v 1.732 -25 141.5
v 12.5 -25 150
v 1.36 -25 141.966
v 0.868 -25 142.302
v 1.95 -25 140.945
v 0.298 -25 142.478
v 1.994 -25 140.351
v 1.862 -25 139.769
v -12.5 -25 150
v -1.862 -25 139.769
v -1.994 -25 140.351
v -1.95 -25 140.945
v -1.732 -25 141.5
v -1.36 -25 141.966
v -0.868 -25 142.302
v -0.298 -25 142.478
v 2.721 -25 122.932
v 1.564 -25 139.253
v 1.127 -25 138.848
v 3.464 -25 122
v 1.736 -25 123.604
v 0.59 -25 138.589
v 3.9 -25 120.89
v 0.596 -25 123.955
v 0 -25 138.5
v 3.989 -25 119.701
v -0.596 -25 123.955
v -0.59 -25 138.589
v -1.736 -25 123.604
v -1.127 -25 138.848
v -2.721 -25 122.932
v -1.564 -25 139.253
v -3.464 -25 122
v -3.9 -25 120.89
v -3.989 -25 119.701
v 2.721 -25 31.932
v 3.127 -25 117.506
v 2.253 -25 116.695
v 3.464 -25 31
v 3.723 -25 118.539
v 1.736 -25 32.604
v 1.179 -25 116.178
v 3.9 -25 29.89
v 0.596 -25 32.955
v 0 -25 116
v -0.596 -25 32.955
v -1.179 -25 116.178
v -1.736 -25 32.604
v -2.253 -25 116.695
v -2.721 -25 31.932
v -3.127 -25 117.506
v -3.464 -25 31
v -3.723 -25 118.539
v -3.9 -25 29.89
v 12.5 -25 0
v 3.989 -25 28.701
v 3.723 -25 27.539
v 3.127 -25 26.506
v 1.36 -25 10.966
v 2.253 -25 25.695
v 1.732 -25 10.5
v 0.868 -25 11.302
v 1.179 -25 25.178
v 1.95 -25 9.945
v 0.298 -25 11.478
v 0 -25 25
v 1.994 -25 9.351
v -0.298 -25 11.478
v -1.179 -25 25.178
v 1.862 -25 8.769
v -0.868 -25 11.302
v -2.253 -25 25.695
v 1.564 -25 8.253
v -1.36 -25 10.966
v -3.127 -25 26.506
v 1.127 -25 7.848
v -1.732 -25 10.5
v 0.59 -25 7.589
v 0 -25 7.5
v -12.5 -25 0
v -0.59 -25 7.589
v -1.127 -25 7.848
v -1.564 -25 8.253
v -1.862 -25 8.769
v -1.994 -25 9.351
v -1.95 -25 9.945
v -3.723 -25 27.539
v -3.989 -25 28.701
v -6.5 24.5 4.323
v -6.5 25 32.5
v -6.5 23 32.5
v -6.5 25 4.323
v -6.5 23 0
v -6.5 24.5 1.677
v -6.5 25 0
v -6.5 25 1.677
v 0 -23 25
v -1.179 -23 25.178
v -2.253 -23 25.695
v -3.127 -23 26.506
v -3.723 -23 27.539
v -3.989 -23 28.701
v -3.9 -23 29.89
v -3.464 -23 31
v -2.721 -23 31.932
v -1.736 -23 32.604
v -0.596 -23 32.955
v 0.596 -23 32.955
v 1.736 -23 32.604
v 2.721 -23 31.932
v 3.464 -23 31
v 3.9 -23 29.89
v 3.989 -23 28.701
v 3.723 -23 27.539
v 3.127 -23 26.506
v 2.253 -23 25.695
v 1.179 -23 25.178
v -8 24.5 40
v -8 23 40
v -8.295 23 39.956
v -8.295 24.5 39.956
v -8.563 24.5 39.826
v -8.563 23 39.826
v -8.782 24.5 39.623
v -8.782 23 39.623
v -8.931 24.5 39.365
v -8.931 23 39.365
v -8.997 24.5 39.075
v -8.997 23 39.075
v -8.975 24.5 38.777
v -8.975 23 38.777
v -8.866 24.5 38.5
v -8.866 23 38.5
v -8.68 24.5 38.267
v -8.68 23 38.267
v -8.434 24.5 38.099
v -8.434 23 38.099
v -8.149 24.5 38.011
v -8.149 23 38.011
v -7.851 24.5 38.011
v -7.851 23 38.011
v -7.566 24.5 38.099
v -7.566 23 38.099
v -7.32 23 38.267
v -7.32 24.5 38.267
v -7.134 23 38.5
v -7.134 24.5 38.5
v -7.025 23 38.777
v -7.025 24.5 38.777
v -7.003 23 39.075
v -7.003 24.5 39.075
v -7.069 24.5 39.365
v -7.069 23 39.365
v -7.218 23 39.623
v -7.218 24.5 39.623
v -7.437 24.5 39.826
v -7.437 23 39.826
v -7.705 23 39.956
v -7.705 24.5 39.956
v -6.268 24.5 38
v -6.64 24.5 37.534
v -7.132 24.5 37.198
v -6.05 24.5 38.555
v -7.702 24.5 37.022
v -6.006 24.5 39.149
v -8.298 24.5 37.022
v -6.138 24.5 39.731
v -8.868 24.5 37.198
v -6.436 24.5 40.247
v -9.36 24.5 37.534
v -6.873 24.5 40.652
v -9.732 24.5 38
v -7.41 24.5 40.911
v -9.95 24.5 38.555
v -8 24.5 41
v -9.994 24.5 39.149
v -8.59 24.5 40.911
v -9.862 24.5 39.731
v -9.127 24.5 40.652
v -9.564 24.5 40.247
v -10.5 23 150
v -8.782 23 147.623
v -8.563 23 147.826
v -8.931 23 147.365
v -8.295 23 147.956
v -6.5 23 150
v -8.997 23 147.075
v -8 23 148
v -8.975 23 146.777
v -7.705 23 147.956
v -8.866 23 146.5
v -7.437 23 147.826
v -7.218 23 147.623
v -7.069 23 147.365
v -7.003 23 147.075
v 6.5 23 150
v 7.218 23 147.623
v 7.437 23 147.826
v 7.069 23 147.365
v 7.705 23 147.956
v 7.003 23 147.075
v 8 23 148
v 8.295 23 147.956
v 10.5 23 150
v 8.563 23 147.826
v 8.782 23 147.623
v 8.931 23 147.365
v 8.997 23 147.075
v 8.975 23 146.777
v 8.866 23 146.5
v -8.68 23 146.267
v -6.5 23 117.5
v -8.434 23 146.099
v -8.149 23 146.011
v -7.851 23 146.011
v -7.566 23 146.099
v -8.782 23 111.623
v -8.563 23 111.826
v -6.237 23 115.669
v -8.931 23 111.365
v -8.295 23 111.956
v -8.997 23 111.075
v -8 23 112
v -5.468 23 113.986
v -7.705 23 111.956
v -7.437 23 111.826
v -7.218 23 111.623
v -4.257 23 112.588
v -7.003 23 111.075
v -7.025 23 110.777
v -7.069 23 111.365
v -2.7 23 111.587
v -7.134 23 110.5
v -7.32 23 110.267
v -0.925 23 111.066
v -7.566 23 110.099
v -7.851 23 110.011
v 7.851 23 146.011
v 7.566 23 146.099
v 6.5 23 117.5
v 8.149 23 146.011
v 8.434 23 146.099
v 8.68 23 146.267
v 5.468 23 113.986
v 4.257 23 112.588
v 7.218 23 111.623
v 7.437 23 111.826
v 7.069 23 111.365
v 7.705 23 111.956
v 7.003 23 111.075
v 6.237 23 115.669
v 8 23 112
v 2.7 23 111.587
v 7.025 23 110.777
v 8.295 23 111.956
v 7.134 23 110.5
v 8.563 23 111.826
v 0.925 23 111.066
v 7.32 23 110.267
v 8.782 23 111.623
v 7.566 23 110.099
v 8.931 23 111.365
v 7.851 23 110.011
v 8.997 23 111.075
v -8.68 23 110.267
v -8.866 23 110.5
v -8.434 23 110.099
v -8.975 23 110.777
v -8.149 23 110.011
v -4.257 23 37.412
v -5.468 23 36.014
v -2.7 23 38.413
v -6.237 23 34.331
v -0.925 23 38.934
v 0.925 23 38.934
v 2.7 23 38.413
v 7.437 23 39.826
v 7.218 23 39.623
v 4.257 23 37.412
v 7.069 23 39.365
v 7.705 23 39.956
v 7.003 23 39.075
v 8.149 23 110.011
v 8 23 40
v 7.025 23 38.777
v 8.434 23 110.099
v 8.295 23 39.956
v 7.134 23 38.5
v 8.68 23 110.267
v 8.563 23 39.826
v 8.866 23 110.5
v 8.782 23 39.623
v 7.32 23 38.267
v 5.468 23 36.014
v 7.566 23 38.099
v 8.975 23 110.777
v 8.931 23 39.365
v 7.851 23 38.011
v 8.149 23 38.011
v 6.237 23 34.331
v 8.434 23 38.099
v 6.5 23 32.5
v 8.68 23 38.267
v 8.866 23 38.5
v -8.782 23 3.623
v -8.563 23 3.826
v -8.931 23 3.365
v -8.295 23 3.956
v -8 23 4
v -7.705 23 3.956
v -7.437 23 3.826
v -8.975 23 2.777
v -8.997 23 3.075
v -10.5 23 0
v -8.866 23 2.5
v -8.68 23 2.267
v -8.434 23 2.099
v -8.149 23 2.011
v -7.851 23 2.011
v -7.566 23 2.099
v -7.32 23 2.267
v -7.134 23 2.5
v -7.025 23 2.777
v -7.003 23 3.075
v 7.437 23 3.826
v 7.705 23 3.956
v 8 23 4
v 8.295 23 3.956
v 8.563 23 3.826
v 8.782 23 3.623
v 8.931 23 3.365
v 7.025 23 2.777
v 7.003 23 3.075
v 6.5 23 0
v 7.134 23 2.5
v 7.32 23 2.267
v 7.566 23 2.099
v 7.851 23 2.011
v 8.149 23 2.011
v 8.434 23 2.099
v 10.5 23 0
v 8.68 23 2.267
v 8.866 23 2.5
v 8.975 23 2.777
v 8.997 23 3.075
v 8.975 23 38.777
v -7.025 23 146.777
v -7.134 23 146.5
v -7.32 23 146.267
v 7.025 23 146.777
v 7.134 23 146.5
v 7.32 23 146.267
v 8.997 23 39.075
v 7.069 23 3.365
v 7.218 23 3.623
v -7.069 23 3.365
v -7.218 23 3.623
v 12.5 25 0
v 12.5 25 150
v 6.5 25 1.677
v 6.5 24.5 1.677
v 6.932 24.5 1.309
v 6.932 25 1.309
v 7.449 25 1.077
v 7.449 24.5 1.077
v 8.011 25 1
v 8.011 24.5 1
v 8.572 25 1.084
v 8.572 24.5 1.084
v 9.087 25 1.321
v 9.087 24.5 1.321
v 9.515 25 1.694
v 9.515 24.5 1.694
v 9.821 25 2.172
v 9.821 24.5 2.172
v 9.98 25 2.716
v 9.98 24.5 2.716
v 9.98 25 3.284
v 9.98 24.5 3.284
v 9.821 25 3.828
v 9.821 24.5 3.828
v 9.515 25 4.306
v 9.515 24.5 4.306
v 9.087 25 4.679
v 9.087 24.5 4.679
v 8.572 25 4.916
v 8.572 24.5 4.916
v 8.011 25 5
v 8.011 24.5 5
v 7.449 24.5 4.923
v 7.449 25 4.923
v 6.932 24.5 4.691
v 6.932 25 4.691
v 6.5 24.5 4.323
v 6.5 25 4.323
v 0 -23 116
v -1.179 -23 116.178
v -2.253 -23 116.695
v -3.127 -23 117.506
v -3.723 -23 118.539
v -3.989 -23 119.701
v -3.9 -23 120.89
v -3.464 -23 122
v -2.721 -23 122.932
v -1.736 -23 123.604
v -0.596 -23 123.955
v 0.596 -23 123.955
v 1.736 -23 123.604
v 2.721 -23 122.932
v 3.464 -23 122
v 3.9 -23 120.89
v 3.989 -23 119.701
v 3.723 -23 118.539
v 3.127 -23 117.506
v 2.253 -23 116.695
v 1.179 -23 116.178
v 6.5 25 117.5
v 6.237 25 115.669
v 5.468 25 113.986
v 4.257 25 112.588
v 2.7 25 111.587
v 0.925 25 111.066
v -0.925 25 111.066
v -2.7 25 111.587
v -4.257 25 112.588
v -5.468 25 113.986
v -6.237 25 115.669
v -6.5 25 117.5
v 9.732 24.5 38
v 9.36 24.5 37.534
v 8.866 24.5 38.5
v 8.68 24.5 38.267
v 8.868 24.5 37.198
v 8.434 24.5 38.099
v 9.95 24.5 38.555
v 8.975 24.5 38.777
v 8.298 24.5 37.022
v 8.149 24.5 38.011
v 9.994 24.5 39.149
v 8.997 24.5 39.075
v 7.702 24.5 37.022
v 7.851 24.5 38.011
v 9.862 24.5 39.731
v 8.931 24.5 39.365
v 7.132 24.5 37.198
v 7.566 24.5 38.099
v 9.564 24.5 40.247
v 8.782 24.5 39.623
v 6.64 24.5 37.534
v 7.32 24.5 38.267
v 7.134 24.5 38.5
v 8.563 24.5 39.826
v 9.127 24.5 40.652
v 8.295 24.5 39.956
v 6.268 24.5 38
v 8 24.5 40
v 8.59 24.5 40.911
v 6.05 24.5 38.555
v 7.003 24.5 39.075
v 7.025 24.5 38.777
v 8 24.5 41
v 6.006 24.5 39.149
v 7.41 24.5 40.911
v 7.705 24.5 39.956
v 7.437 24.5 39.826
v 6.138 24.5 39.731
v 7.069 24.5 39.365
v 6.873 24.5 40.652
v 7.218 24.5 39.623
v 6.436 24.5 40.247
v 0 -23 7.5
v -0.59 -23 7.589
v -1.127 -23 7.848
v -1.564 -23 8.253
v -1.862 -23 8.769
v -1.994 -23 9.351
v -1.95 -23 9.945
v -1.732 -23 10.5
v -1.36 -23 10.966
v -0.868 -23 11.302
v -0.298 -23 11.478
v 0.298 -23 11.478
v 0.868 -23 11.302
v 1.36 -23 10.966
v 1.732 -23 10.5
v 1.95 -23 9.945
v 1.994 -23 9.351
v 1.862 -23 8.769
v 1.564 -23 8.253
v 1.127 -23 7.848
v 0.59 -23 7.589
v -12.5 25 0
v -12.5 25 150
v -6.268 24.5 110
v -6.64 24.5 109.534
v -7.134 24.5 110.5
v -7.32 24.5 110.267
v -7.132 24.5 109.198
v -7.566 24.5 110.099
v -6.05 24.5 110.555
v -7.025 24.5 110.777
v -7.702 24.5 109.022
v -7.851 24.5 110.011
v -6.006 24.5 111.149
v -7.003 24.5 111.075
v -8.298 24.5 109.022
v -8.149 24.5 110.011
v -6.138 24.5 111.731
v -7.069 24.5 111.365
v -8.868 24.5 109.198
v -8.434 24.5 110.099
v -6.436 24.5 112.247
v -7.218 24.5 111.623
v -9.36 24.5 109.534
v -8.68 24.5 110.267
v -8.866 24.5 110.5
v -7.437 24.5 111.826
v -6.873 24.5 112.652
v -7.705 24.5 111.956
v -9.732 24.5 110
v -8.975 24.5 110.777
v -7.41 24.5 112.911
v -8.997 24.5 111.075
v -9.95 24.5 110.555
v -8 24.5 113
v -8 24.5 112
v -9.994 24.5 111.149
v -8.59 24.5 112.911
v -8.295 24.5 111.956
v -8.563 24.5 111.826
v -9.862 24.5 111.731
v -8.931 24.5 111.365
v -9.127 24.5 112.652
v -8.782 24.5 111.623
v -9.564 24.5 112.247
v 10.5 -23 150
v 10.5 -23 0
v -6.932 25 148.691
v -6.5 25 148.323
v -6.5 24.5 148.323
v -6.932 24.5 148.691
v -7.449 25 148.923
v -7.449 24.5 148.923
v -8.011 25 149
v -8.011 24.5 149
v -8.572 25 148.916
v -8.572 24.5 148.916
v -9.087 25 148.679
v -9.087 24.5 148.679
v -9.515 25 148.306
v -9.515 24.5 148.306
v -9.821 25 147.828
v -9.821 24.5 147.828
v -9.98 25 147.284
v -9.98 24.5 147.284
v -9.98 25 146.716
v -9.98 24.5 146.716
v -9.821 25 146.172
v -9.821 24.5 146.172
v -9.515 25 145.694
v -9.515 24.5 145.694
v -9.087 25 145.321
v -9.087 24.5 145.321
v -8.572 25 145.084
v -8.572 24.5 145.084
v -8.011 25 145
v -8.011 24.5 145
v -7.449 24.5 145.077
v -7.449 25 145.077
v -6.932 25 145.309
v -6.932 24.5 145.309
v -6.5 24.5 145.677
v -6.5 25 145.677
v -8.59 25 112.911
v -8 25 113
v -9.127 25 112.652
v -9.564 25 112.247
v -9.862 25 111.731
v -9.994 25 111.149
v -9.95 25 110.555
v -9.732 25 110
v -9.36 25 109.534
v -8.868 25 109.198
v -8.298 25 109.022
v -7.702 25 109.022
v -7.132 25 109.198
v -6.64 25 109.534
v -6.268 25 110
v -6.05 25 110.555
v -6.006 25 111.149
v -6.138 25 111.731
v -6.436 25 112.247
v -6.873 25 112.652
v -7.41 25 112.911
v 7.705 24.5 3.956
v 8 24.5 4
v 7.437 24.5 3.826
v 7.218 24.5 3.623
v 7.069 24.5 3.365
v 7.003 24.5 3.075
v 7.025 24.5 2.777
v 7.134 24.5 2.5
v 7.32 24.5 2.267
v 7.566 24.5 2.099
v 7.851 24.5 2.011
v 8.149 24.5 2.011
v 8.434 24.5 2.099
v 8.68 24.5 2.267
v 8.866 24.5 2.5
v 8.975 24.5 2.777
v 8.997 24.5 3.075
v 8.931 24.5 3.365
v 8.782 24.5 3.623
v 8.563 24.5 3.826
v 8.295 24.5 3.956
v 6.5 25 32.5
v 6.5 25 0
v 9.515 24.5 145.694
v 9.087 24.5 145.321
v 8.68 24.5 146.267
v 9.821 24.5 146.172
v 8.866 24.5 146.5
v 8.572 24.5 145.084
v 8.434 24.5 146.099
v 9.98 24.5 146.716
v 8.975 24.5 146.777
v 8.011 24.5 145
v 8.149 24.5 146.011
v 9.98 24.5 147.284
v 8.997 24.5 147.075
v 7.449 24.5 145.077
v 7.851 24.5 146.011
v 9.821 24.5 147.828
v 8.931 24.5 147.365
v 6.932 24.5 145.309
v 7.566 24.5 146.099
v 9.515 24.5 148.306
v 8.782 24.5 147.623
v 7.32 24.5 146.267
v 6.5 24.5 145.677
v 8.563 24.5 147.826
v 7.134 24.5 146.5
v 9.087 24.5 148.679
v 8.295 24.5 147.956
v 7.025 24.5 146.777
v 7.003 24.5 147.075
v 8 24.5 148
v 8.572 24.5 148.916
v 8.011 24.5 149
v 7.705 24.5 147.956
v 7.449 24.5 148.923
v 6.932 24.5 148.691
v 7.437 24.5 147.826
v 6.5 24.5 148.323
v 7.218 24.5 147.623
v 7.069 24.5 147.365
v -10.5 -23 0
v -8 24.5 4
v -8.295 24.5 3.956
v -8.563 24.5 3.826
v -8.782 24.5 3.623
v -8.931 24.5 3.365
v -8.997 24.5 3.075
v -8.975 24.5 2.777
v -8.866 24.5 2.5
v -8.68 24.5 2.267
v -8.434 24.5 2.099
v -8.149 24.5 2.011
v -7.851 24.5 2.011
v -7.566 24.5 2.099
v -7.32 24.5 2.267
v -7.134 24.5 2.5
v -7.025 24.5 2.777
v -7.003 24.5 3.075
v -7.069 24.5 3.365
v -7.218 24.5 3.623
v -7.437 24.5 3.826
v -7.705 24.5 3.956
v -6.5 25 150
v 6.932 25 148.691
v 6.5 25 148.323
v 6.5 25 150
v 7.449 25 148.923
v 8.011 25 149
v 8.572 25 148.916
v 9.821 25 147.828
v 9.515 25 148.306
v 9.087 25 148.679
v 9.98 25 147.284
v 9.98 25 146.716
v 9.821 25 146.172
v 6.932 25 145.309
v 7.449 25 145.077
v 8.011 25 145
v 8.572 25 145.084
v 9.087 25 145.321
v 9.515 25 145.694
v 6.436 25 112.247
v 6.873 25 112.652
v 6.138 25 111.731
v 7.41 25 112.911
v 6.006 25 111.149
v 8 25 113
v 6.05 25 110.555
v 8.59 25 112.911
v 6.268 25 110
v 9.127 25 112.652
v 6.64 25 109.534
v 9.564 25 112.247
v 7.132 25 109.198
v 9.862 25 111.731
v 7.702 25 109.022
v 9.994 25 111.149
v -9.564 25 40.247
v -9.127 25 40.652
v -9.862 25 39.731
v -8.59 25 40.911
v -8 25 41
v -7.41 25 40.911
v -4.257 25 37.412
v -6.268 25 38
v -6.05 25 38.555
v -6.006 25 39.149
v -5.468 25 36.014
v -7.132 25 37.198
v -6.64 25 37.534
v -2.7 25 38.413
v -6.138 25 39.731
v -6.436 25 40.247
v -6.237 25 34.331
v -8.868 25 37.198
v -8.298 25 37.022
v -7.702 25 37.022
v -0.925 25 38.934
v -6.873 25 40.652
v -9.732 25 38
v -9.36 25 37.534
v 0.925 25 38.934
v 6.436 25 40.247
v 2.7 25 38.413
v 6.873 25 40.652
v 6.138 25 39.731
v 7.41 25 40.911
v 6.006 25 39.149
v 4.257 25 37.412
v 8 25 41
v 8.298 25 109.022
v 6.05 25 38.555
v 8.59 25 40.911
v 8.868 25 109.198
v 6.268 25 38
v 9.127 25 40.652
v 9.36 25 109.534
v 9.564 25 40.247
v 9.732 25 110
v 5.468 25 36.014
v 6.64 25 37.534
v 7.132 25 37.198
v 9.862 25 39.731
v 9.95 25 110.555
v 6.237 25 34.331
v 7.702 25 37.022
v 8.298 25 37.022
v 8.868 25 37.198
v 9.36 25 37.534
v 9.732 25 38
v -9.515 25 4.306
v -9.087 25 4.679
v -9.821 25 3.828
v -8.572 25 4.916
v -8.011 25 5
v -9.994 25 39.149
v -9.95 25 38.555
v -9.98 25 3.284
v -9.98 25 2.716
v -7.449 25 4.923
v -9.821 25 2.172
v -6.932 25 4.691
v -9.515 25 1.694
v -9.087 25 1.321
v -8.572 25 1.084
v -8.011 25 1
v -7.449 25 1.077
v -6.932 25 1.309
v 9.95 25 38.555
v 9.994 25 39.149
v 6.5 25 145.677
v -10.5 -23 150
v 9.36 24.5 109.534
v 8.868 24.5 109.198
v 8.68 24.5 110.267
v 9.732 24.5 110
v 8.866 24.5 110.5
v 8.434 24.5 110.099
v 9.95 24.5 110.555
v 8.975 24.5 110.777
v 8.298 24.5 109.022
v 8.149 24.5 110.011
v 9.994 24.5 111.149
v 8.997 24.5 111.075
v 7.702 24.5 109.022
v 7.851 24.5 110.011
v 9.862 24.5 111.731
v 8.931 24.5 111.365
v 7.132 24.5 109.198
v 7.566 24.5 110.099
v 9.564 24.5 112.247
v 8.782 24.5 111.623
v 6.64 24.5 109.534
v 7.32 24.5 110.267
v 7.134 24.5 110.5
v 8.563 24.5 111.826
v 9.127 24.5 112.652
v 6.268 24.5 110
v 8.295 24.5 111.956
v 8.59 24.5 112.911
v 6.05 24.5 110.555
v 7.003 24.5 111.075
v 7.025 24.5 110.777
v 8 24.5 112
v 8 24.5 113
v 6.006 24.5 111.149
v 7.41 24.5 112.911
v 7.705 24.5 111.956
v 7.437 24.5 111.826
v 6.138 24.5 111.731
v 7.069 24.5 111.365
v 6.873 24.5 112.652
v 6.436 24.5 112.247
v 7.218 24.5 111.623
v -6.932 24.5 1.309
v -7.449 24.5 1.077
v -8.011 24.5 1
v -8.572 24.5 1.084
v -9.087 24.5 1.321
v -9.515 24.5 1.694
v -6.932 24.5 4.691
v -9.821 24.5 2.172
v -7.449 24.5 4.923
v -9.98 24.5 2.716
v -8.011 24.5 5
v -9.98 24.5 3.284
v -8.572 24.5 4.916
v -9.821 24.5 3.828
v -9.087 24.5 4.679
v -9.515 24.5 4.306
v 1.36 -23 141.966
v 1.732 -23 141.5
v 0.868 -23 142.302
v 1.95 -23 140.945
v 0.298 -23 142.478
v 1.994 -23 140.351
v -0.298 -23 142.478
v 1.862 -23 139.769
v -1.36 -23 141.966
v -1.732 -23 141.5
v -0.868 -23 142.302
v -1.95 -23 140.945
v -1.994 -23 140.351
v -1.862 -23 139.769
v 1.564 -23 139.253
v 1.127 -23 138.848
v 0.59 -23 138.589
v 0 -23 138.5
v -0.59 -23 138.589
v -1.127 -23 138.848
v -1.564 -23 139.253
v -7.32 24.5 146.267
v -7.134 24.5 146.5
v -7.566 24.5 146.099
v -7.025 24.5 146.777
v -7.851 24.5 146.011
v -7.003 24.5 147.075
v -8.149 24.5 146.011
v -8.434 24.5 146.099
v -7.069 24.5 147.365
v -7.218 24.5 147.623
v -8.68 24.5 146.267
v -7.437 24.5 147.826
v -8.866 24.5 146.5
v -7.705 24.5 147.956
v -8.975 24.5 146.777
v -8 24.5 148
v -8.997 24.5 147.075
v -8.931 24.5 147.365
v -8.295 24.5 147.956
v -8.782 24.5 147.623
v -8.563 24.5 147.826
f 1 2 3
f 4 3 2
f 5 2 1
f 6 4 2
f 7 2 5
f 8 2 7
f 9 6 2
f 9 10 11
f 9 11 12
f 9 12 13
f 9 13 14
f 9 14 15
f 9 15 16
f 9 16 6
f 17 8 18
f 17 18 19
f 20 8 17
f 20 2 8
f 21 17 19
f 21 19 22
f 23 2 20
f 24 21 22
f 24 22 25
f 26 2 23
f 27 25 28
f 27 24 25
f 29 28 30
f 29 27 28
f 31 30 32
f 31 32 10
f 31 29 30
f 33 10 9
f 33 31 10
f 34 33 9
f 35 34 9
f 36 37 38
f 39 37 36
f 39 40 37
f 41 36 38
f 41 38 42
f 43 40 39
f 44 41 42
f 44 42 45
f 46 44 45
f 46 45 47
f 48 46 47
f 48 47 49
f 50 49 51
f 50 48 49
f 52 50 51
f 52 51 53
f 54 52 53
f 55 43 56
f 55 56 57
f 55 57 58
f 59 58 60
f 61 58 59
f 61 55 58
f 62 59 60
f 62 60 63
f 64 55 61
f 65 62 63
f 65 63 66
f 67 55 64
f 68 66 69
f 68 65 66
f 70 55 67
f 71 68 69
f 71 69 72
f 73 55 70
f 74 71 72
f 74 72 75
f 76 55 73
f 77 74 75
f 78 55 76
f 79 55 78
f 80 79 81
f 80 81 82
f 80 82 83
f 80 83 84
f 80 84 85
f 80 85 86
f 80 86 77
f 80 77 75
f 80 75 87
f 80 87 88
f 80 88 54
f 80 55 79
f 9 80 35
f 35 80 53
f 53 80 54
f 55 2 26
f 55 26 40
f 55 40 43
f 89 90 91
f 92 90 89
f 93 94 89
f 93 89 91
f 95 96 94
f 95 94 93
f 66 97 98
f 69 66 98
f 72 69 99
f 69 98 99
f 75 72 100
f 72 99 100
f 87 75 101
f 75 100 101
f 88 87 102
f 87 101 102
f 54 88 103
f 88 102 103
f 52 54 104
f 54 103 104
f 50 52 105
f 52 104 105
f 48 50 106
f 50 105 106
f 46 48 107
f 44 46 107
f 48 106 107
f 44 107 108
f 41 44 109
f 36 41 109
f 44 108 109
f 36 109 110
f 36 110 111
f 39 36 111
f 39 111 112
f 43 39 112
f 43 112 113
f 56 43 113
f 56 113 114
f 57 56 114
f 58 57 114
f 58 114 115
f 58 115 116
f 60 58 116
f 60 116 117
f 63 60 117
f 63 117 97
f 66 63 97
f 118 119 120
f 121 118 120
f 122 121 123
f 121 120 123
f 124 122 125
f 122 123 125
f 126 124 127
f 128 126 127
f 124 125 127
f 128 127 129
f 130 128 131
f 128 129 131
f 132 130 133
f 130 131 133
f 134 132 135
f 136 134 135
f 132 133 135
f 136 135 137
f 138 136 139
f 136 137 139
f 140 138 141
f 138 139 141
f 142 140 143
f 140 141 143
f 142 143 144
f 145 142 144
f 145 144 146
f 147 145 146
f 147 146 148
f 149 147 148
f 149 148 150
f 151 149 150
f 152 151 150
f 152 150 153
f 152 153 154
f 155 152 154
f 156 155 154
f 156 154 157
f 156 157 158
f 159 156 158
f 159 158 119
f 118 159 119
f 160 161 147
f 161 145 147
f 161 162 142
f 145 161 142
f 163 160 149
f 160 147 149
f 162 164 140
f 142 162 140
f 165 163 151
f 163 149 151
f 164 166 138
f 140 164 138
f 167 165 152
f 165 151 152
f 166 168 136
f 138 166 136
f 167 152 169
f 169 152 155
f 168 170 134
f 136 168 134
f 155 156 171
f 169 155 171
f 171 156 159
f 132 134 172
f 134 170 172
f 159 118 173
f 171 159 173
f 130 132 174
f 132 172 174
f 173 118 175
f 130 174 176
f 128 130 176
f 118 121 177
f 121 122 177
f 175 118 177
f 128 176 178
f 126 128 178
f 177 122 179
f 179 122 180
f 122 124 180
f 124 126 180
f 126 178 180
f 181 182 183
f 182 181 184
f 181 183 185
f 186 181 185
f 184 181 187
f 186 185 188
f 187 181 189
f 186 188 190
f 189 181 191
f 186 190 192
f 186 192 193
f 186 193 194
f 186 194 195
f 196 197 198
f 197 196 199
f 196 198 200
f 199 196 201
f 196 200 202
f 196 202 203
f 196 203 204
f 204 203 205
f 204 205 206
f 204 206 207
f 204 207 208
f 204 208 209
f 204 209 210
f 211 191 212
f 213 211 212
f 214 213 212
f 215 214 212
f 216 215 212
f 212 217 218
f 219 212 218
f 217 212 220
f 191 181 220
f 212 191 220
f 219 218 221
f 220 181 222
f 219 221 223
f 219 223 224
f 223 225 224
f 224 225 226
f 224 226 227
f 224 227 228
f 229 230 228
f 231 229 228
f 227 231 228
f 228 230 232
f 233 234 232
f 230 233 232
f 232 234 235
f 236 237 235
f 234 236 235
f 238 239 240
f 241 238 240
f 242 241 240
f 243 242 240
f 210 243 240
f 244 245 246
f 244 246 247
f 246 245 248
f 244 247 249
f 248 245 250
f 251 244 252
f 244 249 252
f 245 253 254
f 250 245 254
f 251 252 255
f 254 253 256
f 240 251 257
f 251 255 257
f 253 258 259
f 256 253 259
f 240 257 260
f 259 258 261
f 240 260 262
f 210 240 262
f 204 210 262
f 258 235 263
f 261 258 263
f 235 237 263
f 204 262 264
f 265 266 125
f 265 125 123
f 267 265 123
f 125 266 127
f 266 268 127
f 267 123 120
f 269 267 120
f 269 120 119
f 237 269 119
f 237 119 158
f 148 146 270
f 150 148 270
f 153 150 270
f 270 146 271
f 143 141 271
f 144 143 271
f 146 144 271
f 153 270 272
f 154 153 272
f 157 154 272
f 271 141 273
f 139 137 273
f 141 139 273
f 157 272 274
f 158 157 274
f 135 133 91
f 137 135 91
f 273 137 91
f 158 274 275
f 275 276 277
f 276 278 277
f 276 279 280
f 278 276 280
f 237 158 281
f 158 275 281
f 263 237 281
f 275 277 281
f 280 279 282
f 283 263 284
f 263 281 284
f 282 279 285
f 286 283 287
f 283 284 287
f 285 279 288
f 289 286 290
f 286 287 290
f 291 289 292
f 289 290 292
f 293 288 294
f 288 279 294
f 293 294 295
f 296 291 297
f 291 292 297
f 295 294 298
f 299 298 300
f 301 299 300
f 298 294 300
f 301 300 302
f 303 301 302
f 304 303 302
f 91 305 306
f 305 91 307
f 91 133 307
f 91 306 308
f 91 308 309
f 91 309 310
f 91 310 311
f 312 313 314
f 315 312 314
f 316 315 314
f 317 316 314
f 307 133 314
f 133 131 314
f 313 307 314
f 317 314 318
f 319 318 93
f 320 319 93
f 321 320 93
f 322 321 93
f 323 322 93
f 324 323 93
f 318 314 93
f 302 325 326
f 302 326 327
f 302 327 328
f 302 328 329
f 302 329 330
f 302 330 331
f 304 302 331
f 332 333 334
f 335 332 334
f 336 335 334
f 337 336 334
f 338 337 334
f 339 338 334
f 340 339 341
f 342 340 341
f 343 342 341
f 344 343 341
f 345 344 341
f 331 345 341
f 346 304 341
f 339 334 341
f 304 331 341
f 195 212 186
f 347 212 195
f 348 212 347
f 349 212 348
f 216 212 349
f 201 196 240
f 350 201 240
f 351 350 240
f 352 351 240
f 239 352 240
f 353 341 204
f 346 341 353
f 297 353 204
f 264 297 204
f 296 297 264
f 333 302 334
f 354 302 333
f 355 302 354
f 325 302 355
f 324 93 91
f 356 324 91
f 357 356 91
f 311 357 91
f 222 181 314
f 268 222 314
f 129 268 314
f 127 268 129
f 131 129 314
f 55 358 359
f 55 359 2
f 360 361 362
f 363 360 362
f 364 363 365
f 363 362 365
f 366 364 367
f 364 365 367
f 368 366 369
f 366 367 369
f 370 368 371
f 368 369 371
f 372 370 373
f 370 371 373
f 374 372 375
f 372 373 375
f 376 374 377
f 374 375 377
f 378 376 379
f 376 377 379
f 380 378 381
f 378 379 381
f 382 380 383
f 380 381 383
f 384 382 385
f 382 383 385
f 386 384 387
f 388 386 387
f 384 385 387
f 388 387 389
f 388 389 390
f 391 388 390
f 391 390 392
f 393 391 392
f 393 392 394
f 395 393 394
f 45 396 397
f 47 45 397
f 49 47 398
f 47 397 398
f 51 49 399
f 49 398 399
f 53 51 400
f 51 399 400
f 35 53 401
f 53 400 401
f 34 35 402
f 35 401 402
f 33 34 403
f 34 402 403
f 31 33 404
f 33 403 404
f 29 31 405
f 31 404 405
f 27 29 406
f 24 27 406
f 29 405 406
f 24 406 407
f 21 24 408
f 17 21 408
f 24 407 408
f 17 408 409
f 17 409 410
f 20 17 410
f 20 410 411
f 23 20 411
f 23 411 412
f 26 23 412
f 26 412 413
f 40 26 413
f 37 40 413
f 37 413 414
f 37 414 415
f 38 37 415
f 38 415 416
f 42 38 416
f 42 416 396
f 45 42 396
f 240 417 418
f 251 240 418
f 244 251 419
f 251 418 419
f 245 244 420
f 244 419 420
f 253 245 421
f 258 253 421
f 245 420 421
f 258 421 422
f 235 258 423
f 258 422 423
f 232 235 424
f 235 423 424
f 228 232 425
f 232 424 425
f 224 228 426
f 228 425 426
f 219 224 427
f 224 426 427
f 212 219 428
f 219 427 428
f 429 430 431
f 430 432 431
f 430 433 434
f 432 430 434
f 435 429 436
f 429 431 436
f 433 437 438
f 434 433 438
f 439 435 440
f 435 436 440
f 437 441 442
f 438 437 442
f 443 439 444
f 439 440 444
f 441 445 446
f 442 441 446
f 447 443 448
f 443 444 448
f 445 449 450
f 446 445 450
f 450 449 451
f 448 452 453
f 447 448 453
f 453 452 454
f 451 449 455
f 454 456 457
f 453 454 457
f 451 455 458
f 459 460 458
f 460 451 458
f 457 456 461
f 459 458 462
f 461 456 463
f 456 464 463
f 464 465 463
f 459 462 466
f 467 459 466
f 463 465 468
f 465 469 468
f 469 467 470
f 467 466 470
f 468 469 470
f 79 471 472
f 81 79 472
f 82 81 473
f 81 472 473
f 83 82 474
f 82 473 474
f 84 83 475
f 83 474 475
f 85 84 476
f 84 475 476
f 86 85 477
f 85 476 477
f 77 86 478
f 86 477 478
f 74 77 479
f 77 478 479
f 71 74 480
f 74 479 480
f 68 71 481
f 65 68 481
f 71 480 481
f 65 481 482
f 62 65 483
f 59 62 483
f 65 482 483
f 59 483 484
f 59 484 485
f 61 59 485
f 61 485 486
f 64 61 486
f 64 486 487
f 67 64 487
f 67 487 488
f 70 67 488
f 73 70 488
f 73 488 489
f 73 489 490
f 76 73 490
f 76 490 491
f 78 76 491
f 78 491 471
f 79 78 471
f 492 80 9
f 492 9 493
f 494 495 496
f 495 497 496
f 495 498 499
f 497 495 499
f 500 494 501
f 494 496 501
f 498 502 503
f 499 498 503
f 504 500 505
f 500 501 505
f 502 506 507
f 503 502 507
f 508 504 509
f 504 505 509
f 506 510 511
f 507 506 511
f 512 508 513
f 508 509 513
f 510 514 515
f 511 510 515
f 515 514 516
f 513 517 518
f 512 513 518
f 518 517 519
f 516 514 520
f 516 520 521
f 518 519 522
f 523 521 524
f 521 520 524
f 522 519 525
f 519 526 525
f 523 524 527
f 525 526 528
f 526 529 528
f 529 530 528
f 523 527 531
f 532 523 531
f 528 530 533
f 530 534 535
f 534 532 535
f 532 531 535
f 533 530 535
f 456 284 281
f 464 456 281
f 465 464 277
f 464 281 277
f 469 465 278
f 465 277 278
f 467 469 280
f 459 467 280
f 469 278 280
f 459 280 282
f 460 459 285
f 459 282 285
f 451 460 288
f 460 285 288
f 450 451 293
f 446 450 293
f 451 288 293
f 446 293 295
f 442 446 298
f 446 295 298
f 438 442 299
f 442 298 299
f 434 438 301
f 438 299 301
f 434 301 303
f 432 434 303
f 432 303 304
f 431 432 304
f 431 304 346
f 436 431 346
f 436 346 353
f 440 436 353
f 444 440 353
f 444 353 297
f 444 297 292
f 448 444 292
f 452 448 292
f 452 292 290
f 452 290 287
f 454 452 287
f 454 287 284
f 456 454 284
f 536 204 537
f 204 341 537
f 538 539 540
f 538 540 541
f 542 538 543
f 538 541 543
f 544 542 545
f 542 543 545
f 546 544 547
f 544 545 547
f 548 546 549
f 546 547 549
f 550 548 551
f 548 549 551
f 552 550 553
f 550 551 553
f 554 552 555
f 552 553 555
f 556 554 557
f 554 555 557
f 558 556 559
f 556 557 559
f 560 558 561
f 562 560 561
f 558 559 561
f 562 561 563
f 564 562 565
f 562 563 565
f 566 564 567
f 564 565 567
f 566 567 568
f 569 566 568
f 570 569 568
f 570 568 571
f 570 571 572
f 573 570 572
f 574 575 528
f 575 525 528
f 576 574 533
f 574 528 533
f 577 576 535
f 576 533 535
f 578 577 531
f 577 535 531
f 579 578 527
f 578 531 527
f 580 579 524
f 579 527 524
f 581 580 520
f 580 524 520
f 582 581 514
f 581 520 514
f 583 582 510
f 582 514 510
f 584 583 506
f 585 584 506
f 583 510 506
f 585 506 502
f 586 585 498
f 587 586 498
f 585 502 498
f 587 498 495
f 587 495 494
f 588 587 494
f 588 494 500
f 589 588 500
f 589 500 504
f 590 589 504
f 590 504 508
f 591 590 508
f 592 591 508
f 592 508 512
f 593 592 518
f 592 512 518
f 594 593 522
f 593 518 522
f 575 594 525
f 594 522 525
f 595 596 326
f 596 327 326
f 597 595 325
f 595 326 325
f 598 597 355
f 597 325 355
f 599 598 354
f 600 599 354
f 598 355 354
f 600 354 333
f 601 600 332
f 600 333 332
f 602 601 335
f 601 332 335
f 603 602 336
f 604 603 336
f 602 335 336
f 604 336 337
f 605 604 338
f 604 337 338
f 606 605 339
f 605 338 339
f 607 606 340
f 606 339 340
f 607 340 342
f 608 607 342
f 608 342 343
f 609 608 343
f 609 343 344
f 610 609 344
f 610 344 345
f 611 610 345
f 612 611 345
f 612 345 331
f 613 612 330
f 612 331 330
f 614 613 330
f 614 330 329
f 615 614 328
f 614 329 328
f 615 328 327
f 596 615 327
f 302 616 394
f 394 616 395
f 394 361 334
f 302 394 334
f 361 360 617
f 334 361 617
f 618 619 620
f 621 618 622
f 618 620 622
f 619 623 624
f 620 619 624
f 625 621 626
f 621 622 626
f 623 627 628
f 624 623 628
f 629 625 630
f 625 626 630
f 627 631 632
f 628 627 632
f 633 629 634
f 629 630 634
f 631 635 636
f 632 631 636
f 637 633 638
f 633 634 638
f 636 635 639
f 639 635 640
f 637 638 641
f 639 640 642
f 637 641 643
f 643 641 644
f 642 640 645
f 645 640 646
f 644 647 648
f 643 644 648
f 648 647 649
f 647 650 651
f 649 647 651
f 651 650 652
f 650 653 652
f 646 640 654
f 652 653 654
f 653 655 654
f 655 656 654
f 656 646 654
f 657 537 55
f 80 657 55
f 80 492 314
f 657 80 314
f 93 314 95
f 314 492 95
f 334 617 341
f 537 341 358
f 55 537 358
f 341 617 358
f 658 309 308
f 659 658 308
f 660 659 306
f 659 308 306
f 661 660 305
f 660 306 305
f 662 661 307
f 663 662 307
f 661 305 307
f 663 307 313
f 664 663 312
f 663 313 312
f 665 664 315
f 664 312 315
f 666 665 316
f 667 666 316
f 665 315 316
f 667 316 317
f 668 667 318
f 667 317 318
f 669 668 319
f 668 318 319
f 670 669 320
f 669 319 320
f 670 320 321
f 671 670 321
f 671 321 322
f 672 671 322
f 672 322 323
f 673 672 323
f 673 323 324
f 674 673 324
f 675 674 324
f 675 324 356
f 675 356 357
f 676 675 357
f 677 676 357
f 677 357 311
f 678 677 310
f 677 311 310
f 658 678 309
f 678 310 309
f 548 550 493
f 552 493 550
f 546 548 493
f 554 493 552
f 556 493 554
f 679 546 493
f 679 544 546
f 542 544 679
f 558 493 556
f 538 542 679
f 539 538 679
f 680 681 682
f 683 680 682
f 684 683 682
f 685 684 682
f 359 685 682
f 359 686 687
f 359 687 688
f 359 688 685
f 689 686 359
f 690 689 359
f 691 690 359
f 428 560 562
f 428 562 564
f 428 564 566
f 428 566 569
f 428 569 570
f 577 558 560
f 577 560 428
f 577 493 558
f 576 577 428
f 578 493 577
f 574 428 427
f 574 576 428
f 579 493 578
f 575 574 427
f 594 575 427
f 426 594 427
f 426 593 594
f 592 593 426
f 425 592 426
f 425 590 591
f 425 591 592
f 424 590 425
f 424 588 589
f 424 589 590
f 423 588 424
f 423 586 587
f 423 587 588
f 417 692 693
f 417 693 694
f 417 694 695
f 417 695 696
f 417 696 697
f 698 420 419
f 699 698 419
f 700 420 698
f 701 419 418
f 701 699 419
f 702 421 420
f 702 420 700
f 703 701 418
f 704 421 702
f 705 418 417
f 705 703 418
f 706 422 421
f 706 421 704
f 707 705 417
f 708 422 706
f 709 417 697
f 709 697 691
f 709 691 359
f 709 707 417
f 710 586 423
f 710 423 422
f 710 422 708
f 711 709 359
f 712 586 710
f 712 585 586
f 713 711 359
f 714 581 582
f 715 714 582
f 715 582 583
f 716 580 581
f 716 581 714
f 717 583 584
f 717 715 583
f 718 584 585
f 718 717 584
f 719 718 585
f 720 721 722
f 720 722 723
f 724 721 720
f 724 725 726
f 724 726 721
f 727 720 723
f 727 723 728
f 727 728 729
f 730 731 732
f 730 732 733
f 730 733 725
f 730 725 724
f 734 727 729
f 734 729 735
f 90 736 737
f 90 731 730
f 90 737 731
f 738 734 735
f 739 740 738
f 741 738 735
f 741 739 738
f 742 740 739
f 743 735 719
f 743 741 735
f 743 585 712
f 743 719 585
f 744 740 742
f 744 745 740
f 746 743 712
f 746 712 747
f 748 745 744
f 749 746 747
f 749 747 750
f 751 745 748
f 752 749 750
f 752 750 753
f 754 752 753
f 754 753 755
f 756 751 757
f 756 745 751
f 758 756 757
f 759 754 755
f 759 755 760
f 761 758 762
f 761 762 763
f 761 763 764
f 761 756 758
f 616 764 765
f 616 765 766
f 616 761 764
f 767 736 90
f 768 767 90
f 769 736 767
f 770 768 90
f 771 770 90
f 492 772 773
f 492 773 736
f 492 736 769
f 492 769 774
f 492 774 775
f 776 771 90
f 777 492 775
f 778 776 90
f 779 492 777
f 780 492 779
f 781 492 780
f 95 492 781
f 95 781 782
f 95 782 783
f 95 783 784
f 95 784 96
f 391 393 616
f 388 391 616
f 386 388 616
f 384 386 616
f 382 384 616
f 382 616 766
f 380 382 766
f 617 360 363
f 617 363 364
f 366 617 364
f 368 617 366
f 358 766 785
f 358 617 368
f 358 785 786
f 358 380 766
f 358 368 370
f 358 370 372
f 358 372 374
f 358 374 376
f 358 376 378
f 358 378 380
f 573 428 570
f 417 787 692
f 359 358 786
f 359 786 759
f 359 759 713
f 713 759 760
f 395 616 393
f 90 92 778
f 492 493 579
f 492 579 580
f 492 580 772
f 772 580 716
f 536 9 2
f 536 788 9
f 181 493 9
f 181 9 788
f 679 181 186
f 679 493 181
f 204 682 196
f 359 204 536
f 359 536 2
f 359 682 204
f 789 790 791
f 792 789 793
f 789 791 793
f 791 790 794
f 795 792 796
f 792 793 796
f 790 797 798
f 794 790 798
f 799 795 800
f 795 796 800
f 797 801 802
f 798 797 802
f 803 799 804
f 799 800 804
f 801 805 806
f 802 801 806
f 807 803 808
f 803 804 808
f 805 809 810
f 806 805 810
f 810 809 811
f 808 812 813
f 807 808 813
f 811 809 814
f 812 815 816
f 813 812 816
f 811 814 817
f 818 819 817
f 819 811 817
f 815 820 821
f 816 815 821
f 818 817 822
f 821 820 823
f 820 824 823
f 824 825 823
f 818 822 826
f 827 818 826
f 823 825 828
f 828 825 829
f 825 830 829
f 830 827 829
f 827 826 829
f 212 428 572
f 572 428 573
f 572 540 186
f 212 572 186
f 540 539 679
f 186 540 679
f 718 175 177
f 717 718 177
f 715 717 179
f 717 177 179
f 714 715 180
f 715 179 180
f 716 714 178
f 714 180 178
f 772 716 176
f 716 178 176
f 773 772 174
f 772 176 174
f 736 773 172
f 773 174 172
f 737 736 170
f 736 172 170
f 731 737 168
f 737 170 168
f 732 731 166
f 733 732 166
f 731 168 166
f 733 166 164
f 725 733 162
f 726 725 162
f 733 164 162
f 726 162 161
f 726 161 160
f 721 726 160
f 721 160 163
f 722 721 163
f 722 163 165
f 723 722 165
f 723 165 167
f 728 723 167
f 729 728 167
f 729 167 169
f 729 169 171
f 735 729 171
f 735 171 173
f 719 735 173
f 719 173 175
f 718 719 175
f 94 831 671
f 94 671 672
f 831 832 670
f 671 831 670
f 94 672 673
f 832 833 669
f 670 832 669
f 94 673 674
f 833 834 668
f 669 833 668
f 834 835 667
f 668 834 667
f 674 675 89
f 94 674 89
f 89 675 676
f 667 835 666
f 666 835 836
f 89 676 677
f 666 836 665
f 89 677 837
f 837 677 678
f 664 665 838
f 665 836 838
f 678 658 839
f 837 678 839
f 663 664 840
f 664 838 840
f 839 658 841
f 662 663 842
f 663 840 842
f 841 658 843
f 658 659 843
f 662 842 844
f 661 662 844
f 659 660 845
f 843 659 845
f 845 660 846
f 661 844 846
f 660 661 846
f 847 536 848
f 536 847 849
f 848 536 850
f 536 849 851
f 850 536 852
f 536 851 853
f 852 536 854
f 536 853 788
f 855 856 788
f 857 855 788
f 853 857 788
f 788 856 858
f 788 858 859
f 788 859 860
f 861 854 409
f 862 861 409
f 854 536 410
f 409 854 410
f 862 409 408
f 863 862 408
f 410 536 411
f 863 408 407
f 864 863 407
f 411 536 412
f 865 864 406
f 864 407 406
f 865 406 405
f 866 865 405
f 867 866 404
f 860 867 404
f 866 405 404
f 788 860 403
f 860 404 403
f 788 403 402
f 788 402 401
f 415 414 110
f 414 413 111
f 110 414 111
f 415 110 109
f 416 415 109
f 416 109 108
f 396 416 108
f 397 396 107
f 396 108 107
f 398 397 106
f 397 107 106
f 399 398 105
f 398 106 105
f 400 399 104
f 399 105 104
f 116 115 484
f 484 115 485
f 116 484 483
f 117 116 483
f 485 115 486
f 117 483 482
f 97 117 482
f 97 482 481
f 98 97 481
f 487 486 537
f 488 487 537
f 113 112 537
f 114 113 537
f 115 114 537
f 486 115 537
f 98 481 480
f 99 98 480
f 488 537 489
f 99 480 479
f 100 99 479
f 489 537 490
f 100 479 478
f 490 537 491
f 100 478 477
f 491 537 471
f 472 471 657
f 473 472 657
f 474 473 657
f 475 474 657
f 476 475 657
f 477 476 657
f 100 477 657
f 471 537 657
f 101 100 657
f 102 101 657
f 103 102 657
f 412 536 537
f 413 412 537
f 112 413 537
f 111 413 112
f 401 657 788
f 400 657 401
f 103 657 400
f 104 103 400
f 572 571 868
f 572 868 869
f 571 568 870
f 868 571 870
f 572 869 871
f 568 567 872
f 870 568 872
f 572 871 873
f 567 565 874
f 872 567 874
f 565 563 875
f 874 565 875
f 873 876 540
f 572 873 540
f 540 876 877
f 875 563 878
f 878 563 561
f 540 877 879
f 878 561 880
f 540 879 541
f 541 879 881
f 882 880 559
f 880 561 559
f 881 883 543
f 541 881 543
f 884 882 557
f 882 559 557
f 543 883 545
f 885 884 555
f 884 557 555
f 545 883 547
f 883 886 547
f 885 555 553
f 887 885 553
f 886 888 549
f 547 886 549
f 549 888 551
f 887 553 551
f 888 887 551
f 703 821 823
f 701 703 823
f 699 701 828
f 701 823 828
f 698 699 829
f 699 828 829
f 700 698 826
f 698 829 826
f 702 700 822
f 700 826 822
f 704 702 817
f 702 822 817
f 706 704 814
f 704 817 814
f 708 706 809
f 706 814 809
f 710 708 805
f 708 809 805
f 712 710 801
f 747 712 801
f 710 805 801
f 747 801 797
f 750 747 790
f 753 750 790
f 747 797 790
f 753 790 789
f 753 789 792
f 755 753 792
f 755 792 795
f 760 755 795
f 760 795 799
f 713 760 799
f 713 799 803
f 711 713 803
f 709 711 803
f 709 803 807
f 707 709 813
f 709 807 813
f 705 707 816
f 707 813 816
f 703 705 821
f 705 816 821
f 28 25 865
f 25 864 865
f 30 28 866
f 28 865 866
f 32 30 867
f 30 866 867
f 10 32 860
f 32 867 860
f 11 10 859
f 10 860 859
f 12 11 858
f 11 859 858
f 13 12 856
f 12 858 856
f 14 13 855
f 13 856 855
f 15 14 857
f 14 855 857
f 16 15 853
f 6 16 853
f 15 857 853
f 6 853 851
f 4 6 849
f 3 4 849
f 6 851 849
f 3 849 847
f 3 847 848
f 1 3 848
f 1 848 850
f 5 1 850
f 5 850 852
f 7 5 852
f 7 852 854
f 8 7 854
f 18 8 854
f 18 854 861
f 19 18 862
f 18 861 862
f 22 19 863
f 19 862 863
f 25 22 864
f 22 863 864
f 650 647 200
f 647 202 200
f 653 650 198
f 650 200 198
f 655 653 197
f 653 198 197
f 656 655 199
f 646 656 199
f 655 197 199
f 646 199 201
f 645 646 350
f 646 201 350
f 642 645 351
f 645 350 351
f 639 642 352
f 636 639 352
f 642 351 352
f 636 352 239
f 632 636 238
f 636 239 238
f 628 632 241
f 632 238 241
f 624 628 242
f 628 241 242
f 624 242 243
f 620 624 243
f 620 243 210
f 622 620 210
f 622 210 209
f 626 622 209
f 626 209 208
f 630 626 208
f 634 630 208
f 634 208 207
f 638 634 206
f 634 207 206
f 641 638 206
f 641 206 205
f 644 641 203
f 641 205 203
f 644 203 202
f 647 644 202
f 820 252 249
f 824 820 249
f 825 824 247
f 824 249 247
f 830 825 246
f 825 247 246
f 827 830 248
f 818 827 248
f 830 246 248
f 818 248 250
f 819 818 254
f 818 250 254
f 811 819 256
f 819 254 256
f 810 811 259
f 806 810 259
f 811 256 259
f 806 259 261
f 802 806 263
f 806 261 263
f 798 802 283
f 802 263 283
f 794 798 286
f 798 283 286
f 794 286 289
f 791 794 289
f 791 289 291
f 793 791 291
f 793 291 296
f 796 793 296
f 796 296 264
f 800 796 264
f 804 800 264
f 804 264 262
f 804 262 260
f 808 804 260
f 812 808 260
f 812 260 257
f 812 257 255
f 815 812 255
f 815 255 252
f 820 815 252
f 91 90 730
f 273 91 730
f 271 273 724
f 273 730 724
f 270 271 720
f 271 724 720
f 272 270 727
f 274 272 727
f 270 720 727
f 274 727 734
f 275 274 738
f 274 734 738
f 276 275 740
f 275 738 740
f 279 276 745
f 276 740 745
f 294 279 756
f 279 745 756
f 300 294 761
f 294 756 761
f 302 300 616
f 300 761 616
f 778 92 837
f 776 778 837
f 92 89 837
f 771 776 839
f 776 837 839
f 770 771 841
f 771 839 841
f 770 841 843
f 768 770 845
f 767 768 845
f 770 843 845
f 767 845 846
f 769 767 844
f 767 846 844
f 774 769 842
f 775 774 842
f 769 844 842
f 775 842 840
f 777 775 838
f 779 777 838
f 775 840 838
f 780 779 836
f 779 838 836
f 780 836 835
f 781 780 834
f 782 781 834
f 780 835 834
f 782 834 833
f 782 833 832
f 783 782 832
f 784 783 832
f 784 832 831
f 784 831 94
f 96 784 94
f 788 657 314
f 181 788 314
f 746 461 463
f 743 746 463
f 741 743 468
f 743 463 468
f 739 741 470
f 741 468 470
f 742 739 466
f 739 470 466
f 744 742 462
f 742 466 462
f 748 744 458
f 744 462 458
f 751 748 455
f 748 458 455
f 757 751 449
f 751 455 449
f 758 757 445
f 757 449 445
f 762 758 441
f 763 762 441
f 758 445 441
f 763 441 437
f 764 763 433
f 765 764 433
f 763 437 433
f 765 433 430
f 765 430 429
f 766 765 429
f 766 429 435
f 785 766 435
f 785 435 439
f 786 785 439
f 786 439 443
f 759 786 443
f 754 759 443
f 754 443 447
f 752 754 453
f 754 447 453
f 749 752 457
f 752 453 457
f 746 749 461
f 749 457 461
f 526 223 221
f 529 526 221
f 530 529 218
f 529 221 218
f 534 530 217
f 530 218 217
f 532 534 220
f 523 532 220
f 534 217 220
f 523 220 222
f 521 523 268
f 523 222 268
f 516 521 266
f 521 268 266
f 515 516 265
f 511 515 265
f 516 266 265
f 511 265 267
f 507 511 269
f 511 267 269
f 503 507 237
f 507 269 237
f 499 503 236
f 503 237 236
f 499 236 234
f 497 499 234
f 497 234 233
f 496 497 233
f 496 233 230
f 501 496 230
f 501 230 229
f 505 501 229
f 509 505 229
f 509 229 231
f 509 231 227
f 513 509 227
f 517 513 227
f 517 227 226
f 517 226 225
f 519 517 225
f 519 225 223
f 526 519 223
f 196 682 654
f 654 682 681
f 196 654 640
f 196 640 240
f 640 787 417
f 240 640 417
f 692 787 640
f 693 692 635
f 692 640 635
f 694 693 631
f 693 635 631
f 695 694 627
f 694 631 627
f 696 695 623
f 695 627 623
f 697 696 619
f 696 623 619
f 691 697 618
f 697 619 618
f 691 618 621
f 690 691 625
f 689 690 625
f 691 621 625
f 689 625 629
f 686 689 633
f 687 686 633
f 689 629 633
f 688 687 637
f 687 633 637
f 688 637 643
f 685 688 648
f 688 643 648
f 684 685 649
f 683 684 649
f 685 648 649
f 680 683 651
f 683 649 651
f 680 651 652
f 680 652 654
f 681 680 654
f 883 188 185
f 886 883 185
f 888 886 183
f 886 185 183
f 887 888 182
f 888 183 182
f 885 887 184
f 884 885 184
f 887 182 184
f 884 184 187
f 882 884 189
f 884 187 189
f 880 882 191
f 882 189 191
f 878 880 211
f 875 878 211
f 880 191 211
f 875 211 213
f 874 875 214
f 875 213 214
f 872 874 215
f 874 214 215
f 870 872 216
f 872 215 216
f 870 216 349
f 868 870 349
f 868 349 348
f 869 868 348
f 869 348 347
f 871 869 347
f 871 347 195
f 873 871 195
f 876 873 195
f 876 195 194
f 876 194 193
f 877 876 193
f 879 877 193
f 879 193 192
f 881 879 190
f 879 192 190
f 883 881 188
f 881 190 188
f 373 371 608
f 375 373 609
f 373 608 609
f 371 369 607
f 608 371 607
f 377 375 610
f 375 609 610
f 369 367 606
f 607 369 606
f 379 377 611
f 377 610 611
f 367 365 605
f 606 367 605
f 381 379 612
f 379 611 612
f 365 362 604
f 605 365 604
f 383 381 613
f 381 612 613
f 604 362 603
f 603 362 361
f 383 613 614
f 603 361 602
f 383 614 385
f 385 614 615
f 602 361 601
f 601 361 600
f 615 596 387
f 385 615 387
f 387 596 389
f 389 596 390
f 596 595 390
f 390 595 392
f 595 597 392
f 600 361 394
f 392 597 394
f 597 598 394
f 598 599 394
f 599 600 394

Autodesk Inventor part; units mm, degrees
ref_plane "YZ Plane" through (0, 0, 0) normal (1, 0, 0) x (0, 1, 0)
ref_plane "XZ Plane" through (0, 0, 0) normal (0, 1, 0) x (-1, 0, 0)
ref_plane "XY Plane" through (0, 0, 0) normal (0, 0, 1) x (1, 0, 0)
sketch "スケッチ1" plane through (0, 0, 0) normal (0, 0, 1) x (1, 0, 0)
  line L0 (-12.5, 25) -> (12.5, 25)
  line L1 (12.5, 25) -> (12.5, -25)
  line L2 (12.5, -25) -> (-12.5, -25)
  line L3 (-12.5, -25) -> (-12.5, 25)
  line L4 (-10.5, 23) -> (10.5, 23)
  line L5 (10.5, 23) -> (10.5, -23)
  line L6 (10.5, -23) -> (-10.5, -23)
  line L7 (-10.5, -23) -> (-10.5, 23)
  point P0 (0, 0)
  dimension "d0" = 25
  dimension "d1" = 50
  dimension "d2" = 46
  dimension "d3" = 21
  dimension "d4" = 25
  dimension "d5" = 23
  dimension "d6" = 10.5
  dimension "d7" = 12.5
extrude "押し出し1" add sketch "スケッチ1" along normal blind 150
sketch "スケッチ2" plane through (-12.5, 25, 0) normal (0, 1, 0) x (1, 0, 0)
  line L0 (0, 0) -> (25, 0) projected
  line L1 (0, 0) -> (0, -150) projected
  arc A0 (6, -32.5) -> (19, -32.5) centre (12.5, -32.5) ccw
  line L2 (6, -32.5) -> (6, 0)
  line L3 (19, -32.5) -> (19, 0)
  point P0 (12.5, 0)
  dimension "d10" = 13
  dimension "d11" = 32.5
  dimension "d12" = 12.5
extrude "押し出し2" cut sketch "スケッチ2" against normal blind 2
sketch "スケッチ3" plane through (-12.5, 25, 150) normal (0, 1, 0) x (1, 0, 0)
  arc A0 (6, 117.5) -> (19, 117.5) centre (12.5, 117.5) ccw projected
  circle A1 centre (4.5, 111) radius 1
  circle A2 centre (4.5, 147) radius 1
  circle A3 centre (20.5, 147) radius 1
  circle A4 centre (20.5, 111) radius 1
  point P0 (12.5, 150)
  dimension "d15" = 6.5
  dimension "d16" = 6.5
  dimension "d17" = 2
  dimension "d18" = 8
  dimension "d19" = 8
  dimension "d20" = 8
  dimension "d21" = 8
  dimension "d22" = 29.5
  dimension "d23" = 29.5
hole "穴1" at (-8, 25, 3) at (8, 25, 3) at (8, 25, 39) at (-8, 25, 39) direction (0, -1, 0) diameter 2 depth 2 tip angle 118 counterbore diameter 4 counterbore depth 0.5
sketch "スケッチ4" plane through (-12.5, -25, 0) normal (0, -1, 0) x (1, 0, 0)
  line L0 (25, 0) -> (0, 0) projected
  line L1 (25, 0) -> (25, 150) projected
  circle A0 centre (12.5, 9.5) radius 2
  point P0 (12.5, 0)
  dimension "d31" = 4
  dimension "d32" = 12.5
  dimension "d33" = 9.5
hole "穴2" at (0, -25, 9.5) direction (0, 1, 0) diameter 4 end through all
sketch "スケッチ7" plane through (-12.5, -25, 0) normal (0, -1, 0) x (1, 0, 0)
  line L0 (25, 0) -> (25, 150) projected
  circle A0 centre (12.5, 29) radius 4
  line L1 (25, 0) -> (0, 0) projected
  point P0 (12.5, 0)
  dimension "d79" = 8
  dimension "d80" = 12.5
  dimension "d88" = 29
hole "穴5" at (0, -25, 29) direction (0, 1, 0) diameter 8 end through all
sketch "スケッチ9" plane through (-12.5, 25, 150) normal (0, 1, 0) x (1, 0, 0)
  line L0 (0, 150) -> (0, 0) projected
  line L1 (0, 0) -> (25, 0) projected
  line L2 (6, 0) -> (19, 0)
  line L3 (19, 0) -> (19, 32.5)
  line L4 (6, 32.5) -> (6, 0)
  arc A0 (19, 32.5) -> (6, 32.5) centre (12.5, 32.5) ccw
  point P0 (12.5, 150)
  dimension "d92" = 13
  dimension "d93" = 12.5
  dimension "d95" = 32.5
  dimension "d96" = 6.5
  dimension "d97" = 6.5
extrude "押し出し4" cut sketch "スケッチ9" against normal blind 2
sketch "スケッチ10" plane through (12.5, 25, 150) normal (0, 1, 0) x (1, 0, 0)
  arc A0 (-6, 32.5) -> (-19, 32.5) centre (-12.5, 32.5) ccw projected
  circle A1 centre (-20.5, 39) radius 1
  circle A2 centre (-20.5, 3) radius 1
  circle A3 centre (-4.5, 3) radius 1
  circle A4 centre (-4.5, 39) radius 1
  point P0 (-12.5, 150)
  dimension "d100" = 2
  dimension "d102" = 16
  dimension "d103" = 16
  dimension "d106" = 8
  dimension "d110" = 8
  dimension "d138" = 6.5
  dimension "d139" = 6.5
  dimension "d140" = 29.5
  dimension "d141" = 29.5
hole "穴6" at (8, 25, 147) at (-8, 25, 147) at (-8, 25, 111) at (8, 25, 111) direction (0, -1, 0) diameter 2 depth 2 tip angle 118 counterbore diameter 4 counterbore depth 0.5
sketch "スケッチ11" plane through (-12.5, -25, 0) normal (0, -1, 0) x (1, 0, 0)
  line L0 (25, 150) -> (0, 150) projected
  line L1 (25, 0) -> (25, 150) projected
  circle A0 centre (12.5, 140.5) radius 2
  point P0 (12.5, 0)
  dimension "d118" = 9.5
  dimension "d119" = 4
  dimension "d120" = 12.5
hole "穴7" at (0, -25, 140.5) direction (0, 1, 0) diameter 4 depth 2 tip angle 118
sketch "スケッチ12" plane through (-12.5, -25, 0) normal (0, -1, 0) x (1, 0, 0)
  line L0 (25, 150) -> (0, 150) projected
  line L1 (25, 0) -> (25, 150) projected
  circle A0 centre (12.5, 120) radius 4
  point P0 (12.5, 0)
  dimension "d128" = 30
  dimension "d129" = 8
  dimension "d130" = 12.5
hole "穴8" at (0, -25, 120) direction (0, 1, 0) diameter 8 depth 2 tip angle 118
properties part number "07" material "アルミニウム 6061"
